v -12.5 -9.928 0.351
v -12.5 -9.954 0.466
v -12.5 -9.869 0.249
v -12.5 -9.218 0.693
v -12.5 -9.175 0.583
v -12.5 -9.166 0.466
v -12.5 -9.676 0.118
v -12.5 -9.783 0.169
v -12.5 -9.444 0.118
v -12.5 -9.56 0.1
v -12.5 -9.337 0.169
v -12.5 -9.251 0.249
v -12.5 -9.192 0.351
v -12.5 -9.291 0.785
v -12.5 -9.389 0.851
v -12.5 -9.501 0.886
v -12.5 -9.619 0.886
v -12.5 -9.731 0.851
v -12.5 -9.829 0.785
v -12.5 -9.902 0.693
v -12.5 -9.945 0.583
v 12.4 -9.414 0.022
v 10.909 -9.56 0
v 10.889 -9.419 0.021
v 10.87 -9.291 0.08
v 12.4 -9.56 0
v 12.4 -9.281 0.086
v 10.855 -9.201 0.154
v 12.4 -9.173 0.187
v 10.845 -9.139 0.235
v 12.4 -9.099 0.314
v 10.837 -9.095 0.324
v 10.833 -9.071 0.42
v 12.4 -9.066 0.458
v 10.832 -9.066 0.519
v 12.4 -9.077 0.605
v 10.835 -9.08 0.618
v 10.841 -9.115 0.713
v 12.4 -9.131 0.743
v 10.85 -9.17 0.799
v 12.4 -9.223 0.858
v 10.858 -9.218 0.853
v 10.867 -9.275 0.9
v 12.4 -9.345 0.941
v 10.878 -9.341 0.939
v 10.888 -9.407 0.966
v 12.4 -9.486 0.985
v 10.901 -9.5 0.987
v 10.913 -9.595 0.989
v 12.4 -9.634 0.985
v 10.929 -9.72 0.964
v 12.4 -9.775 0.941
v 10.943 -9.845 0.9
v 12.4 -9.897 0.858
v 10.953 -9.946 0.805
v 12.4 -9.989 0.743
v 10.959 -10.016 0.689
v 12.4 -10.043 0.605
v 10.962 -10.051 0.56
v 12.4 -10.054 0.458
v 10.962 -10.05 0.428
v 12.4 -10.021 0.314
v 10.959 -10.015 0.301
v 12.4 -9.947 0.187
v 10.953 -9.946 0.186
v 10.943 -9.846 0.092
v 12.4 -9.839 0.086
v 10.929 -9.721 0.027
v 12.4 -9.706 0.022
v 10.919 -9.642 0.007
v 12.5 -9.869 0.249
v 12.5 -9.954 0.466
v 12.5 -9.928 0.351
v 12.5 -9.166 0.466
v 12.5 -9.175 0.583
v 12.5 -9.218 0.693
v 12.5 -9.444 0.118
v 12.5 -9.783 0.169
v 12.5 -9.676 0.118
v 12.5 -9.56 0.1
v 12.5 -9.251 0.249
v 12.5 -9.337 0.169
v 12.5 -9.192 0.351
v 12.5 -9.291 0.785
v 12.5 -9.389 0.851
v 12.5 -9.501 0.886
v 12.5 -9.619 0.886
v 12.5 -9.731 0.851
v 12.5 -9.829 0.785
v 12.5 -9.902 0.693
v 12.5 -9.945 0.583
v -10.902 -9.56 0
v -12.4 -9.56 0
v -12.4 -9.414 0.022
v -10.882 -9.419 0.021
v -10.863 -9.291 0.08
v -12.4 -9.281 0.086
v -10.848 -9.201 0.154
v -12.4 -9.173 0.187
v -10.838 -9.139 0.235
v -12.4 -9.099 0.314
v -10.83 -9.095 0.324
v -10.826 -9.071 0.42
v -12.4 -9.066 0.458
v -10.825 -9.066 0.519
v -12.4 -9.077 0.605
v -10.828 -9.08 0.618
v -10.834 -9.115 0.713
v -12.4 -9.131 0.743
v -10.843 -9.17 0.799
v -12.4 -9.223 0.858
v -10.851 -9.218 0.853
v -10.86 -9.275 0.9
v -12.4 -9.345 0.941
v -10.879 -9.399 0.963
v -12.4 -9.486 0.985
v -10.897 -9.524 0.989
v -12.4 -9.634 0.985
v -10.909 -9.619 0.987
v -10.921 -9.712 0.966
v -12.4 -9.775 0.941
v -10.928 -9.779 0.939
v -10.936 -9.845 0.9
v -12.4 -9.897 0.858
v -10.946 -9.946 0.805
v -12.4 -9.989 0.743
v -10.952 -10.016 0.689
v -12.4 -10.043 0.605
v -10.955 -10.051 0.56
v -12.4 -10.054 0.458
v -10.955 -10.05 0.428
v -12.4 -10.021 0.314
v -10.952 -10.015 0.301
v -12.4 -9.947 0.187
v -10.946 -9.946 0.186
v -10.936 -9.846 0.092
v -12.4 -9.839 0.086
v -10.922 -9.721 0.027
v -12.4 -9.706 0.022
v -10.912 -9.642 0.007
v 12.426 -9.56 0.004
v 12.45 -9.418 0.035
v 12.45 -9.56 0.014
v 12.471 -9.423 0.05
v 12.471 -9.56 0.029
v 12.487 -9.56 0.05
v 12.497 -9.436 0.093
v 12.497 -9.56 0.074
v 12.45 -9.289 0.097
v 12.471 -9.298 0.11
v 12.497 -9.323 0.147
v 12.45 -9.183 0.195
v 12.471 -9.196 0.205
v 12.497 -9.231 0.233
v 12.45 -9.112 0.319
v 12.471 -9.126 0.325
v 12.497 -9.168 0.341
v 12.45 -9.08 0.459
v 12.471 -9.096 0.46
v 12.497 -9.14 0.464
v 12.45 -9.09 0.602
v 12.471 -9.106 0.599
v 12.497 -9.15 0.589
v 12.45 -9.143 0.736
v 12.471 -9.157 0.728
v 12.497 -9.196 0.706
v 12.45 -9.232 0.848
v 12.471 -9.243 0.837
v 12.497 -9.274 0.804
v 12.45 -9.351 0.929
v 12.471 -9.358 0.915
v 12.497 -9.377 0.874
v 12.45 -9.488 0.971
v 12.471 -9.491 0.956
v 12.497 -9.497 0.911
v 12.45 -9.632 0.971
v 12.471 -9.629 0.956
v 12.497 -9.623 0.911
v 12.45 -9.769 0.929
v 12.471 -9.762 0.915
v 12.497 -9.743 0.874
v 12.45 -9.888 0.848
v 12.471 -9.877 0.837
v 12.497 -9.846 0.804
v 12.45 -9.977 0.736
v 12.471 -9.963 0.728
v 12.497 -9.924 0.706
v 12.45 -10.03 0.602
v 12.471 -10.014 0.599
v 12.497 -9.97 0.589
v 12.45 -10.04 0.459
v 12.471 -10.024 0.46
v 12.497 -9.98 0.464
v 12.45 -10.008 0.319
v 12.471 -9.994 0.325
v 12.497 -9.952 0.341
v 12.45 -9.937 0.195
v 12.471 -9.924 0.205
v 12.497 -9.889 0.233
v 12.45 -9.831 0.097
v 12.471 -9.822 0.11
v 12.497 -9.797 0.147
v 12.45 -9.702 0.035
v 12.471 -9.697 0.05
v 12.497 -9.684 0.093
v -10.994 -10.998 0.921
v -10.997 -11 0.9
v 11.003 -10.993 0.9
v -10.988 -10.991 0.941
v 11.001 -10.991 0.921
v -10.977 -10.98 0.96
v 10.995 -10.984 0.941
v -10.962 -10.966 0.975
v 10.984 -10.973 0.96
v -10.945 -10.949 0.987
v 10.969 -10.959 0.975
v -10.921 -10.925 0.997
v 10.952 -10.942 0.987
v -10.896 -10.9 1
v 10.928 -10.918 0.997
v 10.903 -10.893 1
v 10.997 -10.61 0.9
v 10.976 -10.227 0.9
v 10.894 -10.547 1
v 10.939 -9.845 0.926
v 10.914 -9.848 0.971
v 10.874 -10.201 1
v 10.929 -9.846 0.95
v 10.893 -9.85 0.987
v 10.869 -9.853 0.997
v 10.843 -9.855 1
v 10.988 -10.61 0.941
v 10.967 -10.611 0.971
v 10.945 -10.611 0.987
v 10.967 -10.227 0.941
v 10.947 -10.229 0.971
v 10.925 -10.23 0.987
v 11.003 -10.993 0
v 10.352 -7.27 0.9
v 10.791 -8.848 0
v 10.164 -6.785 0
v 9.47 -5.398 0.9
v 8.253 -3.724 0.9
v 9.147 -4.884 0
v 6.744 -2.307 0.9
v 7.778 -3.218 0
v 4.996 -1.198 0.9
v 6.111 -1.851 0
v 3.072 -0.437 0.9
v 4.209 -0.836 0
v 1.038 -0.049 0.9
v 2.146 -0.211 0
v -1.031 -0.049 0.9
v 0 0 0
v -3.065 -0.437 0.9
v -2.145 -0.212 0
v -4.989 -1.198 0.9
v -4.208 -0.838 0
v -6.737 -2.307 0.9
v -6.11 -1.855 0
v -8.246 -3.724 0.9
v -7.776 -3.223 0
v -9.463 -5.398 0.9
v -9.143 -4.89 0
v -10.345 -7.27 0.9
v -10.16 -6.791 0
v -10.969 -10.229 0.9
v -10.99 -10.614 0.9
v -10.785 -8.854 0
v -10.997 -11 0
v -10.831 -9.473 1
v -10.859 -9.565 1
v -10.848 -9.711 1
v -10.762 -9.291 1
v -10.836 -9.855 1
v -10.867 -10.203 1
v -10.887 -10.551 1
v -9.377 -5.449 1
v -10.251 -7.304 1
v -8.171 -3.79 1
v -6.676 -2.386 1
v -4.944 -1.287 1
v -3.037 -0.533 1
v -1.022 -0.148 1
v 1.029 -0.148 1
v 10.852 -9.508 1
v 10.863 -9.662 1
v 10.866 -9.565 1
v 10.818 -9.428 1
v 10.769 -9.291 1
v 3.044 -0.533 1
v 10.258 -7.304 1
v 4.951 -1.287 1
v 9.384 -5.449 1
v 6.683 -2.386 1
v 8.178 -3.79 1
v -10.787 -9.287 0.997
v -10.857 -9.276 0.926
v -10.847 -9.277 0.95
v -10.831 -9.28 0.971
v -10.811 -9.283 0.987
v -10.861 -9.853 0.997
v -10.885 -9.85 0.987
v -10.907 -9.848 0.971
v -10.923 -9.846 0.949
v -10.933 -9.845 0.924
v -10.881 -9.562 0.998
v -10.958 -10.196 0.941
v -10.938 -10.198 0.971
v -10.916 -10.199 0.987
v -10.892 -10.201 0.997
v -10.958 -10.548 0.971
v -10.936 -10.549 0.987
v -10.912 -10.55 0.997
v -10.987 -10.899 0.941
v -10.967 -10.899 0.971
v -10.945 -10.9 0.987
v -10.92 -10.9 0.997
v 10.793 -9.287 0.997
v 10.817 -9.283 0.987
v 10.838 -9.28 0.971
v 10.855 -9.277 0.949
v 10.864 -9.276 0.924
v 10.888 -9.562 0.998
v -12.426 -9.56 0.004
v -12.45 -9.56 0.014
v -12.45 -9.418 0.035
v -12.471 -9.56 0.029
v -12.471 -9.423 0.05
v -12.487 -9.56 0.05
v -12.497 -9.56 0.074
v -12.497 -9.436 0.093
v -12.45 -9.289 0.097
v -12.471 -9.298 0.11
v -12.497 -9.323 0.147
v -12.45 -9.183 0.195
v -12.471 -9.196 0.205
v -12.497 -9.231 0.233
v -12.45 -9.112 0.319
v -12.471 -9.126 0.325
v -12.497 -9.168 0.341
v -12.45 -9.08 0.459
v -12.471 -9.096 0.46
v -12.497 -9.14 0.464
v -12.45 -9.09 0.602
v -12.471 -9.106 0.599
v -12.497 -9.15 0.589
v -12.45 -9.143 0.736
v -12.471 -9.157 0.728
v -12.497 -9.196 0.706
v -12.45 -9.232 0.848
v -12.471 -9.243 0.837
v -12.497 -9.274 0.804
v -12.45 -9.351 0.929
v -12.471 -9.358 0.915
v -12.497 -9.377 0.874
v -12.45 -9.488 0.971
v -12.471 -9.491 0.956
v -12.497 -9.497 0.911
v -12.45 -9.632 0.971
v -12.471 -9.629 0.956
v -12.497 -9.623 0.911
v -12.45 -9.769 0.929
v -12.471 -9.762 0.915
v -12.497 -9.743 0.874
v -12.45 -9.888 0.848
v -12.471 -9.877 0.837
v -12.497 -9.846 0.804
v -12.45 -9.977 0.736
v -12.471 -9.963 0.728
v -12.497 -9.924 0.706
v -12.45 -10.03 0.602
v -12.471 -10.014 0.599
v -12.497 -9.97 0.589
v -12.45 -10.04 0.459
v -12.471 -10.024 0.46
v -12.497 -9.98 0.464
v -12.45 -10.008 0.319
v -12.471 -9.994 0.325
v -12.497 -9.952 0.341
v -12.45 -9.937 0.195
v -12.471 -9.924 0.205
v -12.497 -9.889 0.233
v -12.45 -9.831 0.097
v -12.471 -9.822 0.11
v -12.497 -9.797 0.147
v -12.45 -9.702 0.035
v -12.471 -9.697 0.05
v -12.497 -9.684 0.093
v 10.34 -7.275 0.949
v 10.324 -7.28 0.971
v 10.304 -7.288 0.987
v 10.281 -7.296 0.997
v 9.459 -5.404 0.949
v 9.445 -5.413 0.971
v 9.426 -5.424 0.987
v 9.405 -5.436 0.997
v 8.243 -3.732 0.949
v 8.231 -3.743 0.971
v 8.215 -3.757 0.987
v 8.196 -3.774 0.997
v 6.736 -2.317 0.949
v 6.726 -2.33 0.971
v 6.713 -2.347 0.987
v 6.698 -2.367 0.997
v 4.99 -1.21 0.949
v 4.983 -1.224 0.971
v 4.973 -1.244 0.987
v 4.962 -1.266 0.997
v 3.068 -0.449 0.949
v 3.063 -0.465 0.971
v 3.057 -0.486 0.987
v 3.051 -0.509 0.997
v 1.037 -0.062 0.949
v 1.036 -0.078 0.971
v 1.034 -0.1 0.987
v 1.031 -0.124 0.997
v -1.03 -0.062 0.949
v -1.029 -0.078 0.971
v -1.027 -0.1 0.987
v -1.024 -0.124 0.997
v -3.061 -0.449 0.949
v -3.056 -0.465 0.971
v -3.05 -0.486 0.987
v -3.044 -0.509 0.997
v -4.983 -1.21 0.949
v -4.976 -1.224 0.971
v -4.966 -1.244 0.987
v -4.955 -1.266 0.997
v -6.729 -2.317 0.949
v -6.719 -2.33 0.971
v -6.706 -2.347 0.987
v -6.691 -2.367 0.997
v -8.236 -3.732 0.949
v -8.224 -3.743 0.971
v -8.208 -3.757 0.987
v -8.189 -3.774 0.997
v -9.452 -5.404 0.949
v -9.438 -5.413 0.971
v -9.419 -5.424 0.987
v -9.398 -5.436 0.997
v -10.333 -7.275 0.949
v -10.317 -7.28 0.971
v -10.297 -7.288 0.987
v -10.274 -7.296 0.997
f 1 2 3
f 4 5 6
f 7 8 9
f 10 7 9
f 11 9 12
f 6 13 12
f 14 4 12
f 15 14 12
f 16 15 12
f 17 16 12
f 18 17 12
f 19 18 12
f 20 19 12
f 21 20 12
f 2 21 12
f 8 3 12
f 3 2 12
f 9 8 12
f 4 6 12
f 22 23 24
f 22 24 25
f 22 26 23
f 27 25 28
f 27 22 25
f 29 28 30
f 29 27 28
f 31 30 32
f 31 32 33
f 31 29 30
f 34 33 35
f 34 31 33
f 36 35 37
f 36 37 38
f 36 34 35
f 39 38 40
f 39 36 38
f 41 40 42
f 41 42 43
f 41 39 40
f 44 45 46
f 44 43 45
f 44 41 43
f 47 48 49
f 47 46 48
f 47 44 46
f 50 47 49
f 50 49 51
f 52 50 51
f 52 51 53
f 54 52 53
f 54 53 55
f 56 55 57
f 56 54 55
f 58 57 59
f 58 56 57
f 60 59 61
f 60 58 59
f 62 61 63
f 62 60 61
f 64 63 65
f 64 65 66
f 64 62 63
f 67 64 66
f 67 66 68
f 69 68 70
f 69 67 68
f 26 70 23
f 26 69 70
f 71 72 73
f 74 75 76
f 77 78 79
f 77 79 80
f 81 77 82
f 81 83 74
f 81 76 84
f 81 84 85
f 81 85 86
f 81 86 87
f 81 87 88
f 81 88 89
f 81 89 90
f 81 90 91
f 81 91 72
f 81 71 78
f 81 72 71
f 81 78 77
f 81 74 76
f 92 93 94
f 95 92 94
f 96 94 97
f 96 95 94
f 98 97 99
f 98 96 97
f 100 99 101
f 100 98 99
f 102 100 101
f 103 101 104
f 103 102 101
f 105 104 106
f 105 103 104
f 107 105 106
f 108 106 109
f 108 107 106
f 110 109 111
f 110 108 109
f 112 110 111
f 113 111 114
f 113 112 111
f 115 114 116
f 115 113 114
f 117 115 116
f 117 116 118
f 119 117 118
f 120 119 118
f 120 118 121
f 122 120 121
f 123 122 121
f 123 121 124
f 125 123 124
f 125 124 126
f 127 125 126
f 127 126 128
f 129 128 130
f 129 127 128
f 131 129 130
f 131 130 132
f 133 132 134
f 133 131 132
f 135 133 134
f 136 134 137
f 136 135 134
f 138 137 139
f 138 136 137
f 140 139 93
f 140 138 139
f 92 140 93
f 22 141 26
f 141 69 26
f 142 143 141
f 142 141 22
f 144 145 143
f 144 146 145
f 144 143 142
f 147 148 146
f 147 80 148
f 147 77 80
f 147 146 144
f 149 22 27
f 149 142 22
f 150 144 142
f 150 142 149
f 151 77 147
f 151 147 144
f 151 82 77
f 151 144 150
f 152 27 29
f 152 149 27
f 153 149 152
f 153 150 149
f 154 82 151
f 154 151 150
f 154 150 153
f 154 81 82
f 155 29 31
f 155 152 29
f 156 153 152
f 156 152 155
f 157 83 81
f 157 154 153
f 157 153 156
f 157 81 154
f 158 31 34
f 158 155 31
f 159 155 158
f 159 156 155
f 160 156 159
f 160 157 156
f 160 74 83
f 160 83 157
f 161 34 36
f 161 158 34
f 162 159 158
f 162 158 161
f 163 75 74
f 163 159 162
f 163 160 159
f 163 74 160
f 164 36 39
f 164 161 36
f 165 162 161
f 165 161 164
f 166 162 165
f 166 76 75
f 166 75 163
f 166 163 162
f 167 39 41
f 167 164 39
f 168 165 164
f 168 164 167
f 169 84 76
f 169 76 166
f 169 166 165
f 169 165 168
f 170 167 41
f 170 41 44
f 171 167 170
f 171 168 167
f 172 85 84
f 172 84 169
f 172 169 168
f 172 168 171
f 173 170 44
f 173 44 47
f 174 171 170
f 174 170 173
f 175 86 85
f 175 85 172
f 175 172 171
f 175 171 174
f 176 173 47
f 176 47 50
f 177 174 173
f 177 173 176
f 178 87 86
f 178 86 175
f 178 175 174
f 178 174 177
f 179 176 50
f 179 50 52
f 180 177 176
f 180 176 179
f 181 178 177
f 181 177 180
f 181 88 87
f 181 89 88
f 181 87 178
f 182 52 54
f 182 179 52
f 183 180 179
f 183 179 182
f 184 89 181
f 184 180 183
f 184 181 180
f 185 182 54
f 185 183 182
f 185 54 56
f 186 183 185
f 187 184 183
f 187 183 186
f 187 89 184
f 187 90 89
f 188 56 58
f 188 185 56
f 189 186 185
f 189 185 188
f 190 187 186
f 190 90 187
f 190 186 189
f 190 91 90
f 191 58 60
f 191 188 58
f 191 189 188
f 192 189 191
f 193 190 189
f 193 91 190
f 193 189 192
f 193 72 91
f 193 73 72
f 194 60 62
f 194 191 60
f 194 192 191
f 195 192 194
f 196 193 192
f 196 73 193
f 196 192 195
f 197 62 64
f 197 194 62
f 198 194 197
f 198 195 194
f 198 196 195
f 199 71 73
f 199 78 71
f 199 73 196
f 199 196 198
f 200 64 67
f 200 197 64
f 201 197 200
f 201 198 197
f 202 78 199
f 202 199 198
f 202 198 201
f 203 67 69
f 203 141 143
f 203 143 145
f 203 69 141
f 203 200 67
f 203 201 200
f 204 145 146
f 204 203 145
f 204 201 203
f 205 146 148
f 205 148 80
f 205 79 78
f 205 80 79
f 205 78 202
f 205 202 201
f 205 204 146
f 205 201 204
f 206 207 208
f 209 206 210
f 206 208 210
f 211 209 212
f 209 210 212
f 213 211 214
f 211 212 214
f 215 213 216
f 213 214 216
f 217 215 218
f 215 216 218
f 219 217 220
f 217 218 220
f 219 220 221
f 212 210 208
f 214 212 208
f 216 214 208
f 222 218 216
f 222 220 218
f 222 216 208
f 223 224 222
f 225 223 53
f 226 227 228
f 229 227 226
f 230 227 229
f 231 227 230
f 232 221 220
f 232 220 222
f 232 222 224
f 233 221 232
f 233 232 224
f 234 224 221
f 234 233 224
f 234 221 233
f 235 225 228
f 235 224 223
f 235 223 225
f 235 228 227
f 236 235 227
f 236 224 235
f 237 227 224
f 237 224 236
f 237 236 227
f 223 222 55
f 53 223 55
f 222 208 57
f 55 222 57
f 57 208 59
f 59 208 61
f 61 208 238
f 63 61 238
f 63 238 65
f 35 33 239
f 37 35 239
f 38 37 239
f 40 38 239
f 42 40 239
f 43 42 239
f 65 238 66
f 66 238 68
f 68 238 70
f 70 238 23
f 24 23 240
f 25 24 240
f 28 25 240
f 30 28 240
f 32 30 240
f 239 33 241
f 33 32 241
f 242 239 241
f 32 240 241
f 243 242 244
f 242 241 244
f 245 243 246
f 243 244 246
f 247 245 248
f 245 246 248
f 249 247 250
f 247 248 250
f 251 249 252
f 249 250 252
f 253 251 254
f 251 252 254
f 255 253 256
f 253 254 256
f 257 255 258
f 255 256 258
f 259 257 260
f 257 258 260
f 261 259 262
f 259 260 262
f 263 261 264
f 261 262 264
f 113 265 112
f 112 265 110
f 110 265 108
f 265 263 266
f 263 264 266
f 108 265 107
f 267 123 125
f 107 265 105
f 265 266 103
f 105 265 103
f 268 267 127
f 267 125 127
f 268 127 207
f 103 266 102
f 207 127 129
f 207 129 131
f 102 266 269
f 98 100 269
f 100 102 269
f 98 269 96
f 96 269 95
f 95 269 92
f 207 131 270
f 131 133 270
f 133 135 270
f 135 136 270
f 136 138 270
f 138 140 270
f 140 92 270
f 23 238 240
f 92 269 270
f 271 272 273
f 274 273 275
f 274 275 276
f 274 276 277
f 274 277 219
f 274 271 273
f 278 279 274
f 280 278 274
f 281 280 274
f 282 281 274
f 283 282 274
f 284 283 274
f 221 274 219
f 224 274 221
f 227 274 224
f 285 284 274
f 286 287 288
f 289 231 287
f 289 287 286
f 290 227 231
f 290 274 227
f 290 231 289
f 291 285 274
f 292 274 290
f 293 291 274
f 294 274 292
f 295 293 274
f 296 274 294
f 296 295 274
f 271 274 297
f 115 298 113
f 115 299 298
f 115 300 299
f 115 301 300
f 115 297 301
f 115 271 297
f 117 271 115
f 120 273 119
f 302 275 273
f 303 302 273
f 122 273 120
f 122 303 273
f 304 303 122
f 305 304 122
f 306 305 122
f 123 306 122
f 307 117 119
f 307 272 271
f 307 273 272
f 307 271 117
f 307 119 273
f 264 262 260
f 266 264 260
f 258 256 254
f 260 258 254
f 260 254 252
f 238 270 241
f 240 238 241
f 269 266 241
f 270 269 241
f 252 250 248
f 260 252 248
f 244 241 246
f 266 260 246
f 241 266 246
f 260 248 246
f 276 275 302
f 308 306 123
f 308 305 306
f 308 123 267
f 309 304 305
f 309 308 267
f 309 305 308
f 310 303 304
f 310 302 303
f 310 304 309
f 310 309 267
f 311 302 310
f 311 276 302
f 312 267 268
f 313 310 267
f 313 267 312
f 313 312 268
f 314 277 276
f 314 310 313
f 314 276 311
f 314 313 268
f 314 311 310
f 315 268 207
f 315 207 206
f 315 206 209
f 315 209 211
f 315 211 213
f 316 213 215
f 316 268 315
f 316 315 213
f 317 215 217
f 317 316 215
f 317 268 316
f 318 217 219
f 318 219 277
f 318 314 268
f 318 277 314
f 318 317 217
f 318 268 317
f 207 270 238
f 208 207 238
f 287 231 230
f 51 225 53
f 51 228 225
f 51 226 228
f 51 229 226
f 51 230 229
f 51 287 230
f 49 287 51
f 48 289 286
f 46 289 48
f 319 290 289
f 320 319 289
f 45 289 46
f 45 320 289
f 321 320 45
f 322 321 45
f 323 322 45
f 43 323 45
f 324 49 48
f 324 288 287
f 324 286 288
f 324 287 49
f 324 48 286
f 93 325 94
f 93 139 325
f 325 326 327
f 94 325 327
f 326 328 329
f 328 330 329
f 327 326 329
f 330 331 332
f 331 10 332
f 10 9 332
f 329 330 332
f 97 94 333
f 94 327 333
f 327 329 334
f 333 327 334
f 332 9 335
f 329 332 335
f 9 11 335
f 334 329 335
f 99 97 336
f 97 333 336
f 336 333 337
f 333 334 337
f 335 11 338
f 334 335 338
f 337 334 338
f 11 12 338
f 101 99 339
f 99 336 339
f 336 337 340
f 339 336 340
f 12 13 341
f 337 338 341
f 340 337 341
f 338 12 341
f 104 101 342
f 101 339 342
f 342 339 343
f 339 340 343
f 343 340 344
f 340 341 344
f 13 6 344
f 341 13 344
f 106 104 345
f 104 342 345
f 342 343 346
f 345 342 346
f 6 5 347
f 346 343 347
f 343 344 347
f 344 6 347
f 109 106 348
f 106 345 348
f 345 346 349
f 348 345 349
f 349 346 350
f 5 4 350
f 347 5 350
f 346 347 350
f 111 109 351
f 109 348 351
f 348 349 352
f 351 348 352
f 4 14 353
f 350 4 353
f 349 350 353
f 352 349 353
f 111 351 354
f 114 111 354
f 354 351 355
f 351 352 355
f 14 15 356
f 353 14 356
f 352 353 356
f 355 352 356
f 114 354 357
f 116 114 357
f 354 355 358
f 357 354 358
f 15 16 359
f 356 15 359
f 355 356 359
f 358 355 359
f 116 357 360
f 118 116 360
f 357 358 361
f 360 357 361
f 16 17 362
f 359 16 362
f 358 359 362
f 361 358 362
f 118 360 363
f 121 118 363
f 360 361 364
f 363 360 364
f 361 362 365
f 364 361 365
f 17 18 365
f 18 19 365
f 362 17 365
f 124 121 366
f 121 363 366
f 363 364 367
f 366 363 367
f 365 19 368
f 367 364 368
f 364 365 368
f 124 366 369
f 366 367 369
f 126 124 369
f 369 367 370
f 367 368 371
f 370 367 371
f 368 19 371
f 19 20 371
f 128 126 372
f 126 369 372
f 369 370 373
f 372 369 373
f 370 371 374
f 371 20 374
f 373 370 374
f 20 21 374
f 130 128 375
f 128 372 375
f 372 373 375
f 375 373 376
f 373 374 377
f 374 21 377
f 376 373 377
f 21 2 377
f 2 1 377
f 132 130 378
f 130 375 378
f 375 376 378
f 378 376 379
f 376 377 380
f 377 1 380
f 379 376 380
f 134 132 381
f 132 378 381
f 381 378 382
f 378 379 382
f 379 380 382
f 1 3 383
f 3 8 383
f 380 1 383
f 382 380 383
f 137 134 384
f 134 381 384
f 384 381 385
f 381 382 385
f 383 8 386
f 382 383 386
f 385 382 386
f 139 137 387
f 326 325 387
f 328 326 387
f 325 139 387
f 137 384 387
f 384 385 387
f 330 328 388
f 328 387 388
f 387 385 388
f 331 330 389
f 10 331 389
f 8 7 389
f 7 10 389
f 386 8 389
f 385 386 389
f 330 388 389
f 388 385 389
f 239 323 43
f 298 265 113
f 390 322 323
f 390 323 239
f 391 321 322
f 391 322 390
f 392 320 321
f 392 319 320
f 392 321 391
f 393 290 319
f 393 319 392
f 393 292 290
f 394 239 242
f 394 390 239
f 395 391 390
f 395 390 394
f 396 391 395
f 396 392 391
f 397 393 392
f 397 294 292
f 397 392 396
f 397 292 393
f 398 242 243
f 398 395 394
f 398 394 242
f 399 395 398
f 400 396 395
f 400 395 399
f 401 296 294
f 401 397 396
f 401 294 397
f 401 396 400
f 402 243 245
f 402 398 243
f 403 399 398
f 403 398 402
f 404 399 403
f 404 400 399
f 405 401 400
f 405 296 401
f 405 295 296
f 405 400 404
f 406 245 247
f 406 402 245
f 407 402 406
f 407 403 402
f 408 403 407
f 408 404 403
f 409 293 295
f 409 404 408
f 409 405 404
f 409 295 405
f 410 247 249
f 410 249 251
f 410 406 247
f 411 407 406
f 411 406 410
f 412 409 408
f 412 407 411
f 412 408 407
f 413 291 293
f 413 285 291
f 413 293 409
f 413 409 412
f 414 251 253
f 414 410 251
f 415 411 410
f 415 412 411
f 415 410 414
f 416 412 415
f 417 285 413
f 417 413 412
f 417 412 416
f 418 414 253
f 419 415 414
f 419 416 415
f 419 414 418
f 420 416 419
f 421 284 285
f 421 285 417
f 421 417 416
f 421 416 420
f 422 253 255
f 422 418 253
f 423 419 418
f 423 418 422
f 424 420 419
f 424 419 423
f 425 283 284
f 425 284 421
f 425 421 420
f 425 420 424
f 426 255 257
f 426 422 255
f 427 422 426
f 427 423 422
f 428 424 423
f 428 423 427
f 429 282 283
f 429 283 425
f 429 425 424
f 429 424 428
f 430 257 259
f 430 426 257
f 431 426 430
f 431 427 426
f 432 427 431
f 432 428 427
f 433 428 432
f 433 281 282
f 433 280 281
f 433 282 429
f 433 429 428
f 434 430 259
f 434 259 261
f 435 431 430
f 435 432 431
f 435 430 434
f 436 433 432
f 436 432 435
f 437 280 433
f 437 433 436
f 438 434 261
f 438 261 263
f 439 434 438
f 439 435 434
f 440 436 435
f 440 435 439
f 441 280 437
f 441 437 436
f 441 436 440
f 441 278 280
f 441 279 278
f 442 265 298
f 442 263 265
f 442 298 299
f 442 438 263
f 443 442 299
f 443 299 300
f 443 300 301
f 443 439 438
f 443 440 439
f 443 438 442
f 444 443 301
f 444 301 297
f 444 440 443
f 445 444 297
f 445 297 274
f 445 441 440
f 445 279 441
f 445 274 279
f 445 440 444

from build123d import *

# Parameters (mm, degrees)
BOSS_EXTRUDE1_DEPTH = 1
SKETCH2_R           = 0.495
BOSS_EXTRUDE2_DEPTH = 12.5
FILLET1_R           = 0.1
FILLET7_R           = 0.1


with BuildPart() as part:
    # Sketch1 → Boss-Extrude1 (new body)
    with BuildSketch(Plane.XY):
        with BuildLine():
            Line((-10.996500042, -10.999999443), (11.003499958, -10.992997297))
            ThreePointArc((11.003499958, -10.992997297), (0, -3e-09), (-10.996500042, -10.999999443))
        make_face()
    extrude(amount=BOSS_EXTRUDE1_DEPTH)

    # Sketch2 → Boss-Extrude2 (add, symmetric)
    with BuildSketch(Plane(origin=(0, 0, 0), x_dir=(0, 0, -1), z_dir=(1, 0, 0))):
        with Locations((-0.495199191, -9.559999443)):
            Circle(SKETCH2_R)
    extrude(amount=BOSS_EXTRUDE2_DEPTH, both=True)

    # Fillet1
    fillet1_edges = [part.edges().sort_by_distance(p)[0] for p in [
        (12.5, -9.559999443, 0.990199191),
        (-12.5, -9.559999443, 0.990199191),
    ]]
    fillet(fillet1_edges, radius=FILLET1_R)

    # Fillet7
    fillet7_edges = [part.edges().sort_by_distance(p)[0] for p in [
        (0, -3e-09, 1),
        (0.003499958, -10.99649837, 1),
    ]]
    fillet(fillet7_edges, radius=FILLET7_R)


solid = part.part
